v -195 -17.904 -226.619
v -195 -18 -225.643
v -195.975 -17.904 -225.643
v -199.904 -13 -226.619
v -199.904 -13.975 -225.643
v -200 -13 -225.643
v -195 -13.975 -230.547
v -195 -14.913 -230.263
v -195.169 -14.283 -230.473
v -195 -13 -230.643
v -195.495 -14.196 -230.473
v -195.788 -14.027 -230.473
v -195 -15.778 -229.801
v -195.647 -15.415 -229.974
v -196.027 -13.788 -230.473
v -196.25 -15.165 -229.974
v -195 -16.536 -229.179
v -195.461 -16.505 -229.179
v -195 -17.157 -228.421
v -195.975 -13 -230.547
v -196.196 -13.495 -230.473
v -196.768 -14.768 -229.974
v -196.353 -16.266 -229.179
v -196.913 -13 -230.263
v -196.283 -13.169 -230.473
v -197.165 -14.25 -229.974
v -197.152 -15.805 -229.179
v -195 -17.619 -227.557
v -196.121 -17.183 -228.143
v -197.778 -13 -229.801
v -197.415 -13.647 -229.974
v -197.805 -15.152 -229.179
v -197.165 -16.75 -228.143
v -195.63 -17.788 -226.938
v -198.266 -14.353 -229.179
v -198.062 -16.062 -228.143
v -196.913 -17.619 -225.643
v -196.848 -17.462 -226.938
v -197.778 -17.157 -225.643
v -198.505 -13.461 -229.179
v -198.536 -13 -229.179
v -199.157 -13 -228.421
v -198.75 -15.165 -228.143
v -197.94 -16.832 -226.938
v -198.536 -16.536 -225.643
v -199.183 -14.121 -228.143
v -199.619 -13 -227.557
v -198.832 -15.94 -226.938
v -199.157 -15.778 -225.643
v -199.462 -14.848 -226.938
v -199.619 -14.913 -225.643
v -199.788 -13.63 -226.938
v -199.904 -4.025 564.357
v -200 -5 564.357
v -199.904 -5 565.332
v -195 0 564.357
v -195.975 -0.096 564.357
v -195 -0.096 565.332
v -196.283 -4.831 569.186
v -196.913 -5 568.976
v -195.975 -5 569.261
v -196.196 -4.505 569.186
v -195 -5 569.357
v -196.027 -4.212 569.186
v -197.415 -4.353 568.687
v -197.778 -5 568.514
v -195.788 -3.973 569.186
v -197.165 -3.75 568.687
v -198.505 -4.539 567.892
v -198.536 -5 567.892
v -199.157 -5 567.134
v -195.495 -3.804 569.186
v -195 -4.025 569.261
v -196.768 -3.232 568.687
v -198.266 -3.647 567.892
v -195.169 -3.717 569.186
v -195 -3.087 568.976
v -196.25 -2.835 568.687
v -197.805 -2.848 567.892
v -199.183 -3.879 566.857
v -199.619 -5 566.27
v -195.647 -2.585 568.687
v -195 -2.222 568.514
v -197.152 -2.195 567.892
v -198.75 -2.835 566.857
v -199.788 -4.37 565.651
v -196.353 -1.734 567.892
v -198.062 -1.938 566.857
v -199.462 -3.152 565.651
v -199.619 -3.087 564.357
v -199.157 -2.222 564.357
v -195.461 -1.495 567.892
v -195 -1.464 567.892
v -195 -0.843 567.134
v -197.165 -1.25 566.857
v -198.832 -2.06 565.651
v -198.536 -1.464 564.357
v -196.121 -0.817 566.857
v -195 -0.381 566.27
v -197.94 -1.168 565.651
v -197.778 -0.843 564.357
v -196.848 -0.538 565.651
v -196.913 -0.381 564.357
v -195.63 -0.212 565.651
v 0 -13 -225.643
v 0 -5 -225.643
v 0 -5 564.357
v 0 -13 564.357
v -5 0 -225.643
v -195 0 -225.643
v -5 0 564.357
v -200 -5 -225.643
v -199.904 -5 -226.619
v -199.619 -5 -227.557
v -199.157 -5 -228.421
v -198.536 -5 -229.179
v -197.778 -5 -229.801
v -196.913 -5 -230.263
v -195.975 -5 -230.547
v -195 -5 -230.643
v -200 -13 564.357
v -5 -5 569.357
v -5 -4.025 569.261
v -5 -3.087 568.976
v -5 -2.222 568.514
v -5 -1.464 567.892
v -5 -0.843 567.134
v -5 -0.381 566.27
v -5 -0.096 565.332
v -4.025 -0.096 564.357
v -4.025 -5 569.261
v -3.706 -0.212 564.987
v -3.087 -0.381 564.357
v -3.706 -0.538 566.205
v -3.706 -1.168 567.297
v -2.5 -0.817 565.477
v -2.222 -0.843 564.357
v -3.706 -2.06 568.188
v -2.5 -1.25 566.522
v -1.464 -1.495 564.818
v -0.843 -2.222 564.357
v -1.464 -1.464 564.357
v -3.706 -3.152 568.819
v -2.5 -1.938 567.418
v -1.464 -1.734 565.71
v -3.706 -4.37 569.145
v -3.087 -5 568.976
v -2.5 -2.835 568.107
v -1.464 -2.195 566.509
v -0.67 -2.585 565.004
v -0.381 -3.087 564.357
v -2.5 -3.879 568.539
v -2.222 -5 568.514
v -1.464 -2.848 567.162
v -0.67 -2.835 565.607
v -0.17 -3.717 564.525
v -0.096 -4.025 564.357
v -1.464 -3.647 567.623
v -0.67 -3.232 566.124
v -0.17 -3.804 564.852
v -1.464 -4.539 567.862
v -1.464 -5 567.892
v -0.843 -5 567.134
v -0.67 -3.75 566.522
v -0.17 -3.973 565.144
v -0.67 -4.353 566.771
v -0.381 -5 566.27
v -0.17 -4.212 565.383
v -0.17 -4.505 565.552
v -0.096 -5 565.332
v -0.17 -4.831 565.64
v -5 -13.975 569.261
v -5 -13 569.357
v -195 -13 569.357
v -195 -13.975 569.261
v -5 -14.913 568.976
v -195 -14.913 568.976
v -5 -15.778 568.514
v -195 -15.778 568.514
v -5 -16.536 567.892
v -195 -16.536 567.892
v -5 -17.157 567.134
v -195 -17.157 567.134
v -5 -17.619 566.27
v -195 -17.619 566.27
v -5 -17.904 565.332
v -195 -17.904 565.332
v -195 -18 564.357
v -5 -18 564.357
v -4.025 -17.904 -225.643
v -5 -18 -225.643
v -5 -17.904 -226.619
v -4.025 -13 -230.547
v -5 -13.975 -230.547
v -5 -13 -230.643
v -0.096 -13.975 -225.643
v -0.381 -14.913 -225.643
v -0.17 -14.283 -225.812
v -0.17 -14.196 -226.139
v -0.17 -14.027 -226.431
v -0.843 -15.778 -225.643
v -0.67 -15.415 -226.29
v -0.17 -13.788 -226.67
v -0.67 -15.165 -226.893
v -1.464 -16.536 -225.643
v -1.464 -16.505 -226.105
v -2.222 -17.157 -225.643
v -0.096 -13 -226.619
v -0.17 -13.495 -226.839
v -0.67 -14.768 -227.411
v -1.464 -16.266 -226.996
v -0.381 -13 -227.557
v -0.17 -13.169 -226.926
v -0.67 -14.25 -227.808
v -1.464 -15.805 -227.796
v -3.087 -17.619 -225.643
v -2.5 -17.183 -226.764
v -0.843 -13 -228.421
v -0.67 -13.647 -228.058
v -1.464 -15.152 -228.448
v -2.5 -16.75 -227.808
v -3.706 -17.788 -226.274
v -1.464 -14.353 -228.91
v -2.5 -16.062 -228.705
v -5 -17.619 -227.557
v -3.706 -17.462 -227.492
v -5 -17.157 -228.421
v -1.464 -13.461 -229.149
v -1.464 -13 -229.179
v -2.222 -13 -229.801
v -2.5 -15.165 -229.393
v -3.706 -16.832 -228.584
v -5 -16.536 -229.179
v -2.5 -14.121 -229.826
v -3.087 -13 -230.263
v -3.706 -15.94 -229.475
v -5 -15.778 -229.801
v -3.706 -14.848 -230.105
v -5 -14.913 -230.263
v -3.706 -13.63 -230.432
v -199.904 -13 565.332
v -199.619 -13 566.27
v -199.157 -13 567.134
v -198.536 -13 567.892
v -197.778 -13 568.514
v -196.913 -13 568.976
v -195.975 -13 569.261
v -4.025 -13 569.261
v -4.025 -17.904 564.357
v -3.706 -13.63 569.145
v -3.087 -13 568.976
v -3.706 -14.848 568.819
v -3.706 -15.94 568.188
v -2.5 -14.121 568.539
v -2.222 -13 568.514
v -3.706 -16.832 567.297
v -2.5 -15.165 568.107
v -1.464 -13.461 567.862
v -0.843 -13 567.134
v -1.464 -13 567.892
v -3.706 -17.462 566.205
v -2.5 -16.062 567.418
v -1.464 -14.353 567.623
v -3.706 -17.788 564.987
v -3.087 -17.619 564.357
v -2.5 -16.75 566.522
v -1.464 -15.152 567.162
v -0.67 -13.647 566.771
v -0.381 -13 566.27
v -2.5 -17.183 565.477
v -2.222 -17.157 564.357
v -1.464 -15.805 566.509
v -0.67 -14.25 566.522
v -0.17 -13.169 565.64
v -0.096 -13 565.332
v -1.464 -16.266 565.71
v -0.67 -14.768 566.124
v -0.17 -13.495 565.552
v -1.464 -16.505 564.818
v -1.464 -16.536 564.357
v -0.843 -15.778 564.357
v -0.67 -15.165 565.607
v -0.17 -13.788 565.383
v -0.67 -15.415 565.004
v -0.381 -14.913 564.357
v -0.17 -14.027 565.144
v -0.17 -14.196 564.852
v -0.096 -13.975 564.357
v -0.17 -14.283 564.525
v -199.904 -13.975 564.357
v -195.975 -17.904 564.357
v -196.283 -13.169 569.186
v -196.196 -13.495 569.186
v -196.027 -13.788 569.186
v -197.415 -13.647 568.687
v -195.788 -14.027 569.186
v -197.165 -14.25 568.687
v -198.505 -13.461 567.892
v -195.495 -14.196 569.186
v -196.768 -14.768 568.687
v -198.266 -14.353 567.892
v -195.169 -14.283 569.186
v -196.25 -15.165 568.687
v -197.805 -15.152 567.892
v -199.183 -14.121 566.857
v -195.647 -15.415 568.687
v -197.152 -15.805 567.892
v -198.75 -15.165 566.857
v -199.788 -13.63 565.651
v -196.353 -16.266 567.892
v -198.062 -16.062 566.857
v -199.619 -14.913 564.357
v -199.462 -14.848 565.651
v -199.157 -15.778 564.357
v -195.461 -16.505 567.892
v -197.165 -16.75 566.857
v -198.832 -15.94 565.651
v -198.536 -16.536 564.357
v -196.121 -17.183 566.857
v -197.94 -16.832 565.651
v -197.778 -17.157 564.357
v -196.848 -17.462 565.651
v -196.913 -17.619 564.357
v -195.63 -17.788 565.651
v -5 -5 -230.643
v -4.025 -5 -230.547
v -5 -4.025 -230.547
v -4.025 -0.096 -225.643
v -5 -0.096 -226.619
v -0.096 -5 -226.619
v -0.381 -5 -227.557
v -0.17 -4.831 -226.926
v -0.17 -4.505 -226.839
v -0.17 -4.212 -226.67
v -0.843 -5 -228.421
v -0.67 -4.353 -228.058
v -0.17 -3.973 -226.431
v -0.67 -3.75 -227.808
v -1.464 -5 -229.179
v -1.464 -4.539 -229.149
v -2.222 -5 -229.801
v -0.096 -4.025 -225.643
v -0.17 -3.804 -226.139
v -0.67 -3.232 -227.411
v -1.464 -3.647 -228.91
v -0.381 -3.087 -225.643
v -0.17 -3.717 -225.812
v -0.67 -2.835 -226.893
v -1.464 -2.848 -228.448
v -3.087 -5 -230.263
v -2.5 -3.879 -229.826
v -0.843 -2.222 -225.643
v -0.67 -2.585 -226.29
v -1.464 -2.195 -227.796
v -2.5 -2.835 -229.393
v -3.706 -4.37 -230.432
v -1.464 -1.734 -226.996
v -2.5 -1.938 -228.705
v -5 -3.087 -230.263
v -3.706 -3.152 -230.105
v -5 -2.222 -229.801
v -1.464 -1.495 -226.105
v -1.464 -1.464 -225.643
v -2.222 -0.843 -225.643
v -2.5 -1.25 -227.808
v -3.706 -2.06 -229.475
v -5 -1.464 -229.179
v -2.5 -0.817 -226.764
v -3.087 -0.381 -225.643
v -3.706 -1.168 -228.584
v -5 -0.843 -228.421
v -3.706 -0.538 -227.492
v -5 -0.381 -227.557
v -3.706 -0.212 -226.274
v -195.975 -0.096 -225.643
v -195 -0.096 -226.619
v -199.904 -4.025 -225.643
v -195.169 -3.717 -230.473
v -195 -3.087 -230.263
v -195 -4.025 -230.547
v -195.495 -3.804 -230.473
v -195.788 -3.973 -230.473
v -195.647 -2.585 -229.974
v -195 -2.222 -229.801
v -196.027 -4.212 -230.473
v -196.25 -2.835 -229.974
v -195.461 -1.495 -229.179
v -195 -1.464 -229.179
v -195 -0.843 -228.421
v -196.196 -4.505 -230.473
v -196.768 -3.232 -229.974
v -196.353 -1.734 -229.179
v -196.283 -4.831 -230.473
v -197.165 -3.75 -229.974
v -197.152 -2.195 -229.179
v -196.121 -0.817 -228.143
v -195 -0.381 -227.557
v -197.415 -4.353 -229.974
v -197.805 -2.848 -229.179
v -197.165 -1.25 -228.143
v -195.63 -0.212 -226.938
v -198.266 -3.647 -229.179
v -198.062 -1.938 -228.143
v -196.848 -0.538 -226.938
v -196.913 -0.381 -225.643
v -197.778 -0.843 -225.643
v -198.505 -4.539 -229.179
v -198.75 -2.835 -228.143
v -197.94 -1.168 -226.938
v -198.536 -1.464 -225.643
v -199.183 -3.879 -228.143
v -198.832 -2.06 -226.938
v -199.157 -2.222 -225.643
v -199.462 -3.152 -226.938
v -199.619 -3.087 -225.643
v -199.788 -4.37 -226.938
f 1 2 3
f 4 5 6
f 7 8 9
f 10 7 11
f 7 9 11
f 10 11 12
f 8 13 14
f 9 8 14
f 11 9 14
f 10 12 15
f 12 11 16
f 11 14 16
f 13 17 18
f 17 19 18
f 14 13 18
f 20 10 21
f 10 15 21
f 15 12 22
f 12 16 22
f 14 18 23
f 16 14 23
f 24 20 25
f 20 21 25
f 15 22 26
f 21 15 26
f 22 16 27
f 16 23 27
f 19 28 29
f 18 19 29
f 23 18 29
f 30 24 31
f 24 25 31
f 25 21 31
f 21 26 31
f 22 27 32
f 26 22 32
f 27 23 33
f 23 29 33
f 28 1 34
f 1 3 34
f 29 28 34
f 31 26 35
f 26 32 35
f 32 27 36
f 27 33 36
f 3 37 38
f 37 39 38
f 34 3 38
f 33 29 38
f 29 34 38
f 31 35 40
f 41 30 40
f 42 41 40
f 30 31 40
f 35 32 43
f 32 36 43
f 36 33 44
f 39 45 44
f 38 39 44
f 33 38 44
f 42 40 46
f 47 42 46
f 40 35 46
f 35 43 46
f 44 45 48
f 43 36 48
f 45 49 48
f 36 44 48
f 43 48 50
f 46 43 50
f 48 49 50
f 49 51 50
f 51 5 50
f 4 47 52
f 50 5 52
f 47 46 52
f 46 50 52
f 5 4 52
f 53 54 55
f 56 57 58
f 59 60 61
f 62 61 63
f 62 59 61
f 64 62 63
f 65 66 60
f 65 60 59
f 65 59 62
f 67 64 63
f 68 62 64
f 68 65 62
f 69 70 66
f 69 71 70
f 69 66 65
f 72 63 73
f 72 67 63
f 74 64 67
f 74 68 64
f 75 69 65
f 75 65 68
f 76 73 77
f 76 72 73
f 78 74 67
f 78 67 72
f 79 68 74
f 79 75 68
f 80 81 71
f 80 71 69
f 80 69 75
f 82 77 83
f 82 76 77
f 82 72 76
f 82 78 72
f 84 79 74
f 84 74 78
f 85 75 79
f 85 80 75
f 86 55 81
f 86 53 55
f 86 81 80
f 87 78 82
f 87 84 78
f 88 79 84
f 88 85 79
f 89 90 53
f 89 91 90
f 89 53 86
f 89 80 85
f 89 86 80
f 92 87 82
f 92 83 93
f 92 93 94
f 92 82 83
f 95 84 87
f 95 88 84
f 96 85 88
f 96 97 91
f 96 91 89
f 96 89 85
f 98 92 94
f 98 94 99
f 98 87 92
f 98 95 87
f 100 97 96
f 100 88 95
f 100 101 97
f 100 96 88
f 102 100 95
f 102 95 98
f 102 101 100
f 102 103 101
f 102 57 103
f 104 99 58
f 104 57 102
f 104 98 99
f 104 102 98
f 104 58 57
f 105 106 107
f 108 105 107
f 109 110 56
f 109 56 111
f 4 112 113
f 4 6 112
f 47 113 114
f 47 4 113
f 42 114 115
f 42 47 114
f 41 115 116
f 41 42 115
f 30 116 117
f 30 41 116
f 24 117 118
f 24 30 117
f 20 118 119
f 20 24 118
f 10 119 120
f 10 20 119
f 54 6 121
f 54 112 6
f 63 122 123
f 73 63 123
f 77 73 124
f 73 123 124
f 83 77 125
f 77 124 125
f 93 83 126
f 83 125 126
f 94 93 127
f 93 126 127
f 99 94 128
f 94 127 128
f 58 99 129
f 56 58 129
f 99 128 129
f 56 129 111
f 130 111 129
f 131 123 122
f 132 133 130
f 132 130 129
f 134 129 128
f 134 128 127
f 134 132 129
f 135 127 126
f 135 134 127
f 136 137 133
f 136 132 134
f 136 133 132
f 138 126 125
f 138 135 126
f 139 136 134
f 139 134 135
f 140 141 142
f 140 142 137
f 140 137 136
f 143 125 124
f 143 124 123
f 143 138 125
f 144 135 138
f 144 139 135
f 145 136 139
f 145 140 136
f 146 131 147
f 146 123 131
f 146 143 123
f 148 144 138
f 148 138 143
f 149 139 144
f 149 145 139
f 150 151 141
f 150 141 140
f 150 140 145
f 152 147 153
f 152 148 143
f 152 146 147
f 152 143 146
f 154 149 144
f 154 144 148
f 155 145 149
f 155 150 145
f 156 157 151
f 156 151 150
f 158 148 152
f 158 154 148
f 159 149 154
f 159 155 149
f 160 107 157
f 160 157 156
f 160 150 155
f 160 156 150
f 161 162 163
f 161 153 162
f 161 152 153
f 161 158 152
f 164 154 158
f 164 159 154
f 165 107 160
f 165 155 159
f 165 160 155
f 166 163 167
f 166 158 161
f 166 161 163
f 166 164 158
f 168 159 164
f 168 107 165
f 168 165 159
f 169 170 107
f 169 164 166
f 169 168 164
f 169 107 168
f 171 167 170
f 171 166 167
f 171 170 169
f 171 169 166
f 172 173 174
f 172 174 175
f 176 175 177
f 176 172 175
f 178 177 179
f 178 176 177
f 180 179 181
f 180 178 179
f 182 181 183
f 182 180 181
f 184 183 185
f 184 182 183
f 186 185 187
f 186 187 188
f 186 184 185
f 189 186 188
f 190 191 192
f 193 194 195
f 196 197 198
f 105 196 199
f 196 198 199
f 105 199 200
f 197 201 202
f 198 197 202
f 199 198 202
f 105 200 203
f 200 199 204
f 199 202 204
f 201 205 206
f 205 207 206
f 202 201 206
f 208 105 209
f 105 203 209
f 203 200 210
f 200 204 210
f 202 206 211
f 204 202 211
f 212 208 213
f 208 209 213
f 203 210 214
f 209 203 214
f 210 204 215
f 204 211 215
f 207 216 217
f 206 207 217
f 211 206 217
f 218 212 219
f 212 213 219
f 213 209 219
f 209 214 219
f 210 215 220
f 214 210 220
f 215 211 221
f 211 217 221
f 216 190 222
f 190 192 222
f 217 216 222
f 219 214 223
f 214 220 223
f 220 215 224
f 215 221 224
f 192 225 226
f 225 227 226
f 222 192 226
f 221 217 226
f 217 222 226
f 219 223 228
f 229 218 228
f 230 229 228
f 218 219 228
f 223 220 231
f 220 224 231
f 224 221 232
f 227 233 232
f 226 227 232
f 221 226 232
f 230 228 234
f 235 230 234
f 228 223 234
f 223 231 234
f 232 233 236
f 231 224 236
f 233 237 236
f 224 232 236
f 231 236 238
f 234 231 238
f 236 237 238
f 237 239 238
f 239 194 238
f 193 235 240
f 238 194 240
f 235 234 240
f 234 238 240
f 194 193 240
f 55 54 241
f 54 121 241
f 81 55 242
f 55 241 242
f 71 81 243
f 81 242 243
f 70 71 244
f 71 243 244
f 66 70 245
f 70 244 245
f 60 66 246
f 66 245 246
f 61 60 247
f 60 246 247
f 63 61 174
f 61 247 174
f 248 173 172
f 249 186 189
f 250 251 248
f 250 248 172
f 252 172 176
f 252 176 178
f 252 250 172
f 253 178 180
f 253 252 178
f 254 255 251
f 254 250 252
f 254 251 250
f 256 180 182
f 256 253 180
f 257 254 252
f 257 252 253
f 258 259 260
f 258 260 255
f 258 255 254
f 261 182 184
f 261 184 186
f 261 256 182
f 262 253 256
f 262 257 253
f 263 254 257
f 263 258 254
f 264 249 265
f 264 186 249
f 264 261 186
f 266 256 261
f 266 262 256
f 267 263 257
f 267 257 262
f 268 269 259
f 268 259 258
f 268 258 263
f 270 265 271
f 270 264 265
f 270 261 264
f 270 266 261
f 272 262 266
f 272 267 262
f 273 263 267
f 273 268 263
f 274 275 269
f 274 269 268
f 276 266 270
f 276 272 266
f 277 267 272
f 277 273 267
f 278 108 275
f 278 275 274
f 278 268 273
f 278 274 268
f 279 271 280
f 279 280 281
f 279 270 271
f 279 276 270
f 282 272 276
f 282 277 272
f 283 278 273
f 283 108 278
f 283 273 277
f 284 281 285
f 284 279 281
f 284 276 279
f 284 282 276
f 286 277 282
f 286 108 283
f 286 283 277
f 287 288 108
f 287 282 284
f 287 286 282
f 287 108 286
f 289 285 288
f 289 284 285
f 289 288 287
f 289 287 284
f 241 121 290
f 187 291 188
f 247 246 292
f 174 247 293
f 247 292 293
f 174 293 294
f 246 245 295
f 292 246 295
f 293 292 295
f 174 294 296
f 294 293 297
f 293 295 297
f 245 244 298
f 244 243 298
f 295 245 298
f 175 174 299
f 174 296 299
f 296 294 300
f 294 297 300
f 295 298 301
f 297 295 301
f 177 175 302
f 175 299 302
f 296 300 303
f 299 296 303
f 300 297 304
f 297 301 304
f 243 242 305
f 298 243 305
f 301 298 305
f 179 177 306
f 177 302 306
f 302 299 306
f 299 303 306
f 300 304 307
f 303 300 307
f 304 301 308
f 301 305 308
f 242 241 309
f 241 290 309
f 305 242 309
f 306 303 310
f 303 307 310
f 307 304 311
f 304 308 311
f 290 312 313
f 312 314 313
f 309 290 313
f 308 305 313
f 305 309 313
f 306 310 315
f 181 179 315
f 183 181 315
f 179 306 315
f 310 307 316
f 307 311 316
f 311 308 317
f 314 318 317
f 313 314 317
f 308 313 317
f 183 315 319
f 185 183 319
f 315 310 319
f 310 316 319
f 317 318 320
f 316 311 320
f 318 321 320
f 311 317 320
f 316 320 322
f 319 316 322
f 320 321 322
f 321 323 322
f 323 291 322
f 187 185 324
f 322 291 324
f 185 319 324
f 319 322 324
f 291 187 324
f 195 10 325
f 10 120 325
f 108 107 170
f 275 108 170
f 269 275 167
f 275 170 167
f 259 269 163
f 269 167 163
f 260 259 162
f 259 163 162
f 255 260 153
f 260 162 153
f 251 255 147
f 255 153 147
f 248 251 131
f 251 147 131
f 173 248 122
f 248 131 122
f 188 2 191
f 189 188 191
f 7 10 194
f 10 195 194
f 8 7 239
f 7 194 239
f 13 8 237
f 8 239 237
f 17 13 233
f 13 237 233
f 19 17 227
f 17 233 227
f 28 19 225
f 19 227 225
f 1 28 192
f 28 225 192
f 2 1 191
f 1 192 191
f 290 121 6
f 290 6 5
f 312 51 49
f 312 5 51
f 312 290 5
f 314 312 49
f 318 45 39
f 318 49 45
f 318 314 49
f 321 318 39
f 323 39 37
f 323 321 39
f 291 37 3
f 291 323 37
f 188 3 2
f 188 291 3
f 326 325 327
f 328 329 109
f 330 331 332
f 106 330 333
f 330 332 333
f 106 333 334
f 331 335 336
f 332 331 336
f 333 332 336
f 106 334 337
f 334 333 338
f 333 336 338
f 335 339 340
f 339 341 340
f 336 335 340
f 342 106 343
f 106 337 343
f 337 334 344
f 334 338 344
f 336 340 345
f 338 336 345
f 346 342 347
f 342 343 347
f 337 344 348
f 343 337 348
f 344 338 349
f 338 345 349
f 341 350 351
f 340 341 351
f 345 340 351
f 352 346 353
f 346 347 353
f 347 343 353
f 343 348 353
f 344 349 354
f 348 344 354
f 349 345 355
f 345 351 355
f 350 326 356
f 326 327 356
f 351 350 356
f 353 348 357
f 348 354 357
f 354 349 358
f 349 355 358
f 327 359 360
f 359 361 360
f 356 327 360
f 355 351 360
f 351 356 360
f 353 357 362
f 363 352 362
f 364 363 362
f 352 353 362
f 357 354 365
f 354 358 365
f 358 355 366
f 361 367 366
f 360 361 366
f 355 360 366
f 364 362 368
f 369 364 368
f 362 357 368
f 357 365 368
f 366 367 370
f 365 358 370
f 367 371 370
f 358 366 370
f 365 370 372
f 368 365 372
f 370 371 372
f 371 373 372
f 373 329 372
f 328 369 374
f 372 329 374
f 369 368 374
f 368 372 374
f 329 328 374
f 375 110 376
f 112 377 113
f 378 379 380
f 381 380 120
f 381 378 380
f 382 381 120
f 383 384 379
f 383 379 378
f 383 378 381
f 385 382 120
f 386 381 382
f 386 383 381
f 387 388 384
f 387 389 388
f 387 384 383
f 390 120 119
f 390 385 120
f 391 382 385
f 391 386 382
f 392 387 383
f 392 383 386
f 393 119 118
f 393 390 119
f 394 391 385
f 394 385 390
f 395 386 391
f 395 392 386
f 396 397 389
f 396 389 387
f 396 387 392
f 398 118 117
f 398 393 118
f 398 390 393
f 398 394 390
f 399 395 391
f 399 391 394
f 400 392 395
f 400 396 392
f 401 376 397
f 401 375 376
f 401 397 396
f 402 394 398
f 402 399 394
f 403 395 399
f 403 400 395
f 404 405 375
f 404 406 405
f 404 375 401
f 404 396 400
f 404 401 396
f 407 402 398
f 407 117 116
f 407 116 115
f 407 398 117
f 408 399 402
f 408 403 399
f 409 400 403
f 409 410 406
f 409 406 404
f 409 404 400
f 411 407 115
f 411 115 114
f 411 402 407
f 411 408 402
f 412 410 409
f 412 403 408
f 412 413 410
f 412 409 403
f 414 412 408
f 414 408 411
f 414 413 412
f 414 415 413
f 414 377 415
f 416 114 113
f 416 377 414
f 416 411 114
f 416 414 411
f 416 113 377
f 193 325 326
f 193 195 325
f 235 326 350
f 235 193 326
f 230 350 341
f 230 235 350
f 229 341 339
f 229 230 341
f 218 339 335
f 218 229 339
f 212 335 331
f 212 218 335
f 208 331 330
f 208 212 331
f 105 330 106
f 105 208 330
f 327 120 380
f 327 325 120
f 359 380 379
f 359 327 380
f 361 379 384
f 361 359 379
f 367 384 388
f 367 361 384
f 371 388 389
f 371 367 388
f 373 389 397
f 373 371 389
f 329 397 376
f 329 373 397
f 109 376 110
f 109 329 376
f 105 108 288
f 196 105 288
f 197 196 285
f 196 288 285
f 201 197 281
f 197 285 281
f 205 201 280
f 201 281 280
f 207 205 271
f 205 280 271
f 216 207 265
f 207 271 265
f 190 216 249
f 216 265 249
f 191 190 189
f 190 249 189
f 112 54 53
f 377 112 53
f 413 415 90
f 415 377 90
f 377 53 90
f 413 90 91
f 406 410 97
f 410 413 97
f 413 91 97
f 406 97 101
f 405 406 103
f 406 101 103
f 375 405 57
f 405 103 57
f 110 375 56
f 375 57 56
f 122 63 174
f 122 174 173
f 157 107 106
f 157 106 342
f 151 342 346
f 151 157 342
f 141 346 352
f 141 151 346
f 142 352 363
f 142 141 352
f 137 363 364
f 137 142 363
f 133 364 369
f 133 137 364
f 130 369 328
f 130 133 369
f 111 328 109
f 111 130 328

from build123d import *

# Parameters (mm, degrees)
F0_W         = 200
F0_H         = 800
F1_DEPTH     = 18
F2_R         = 5
F3_T1_DEPTH  = 8
F3_S5_W      = 5
F3_S5_H      = 5
F3_T6_DEPTH  = 5
F3_S11_W     = 5
F3_S11_H     = 5
F3_T12_DEPTH = 5


# Not quite as in the source:
# - a fillet or chamfer that OpenCascade refuses, or shapes differently, is made with other operations: its cross-section is extruded or revolved along the edge and cut away or added


with BuildPart() as f1:
    # F0 (on Front) → F1 (new body)
    with BuildSketch(Plane.XZ):
        with Locations((-100, 169.3565798058)):
            Rectangle(F0_W, F0_H)
    extrude(amount=F1_DEPTH)

    # F2
    f2_edges = [f1.edges().sort_by_distance(p)[0] for p in [
        (-200, -18, 169.35658),
        (-200, 0, 169.35658),
        (-100, -18, -230.64342),
        (-100, 0, -230.64342),
        (0, -18, 169.35658),
        (-200, -9, -230.64342),
        (0, -9, -230.64342),
        (-200, -9, 569.35658),
        (-100, -18, 569.35658),
        (-100, 0, 569.35658),
        (0, 0, 169.35658),
    ]]
    fillet(f2_edges, radius=F2_R)

    # F3: fillet of radius 5 on 1 edges, made by hand

    # F3_s2 → F3_t1 (cut)
    with BuildSketch(Plane.XZ.offset(5)):
        with BuildLine():
            ThreePointArc((0, 564.3565798058), (-1.4644660941, 567.8921137117), (-5, 569.3565798058))
            Line((-5, 569.3565798058), (0, 569.3565798058))
            Line((0, 569.3565798058), (0, 564.3565798058))
        make_face()
    extrude(amount=F3_T1_DEPTH, mode=Mode.SUBTRACT)


with BuildPart() as f3_tool4:
    # F3_s5 → F3_t6 (new body)
    with BuildSketch(Plane.YZ.offset(-5)):
        with Locations((-2.5, 566.8565798058)):
            Rectangle(F3_S5_W, F3_S5_H)
    extrude(amount=F3_T6_DEPTH)

    # F3_s7 → F3_t8 (revolve, cut)
    with BuildSketch(Plane(origin=(-5, -5, 564.3565798058), x_dir=(0, -0.7071067812, -0.7071067812), z_dir=(0, -0.7071067812, 0.7071067812))):
        with BuildLine():
            ThreePointArc((0, -5), (5, 0), (0, 5))
            Line((0, 5), (0, -5))
        make_face()
    revolve(axis=Axis((-5, -5, 564.3565798058), (1, 0, 0)), mode=Mode.SUBTRACT)


with BuildPart() as f1_1:
    add(f1.part)

    # F3_t3: cut F3_tool4
    add(f3_tool4.part, mode=Mode.SUBTRACT)


with BuildPart() as f3_tool10:
    # F3_s11 → F3_t12 (new body)
    with BuildSketch(Plane.YZ.offset(-5)):
        with Locations((-15.5, 566.8565798058)):
            Rectangle(F3_S11_W, F3_S11_H)
    extrude(amount=F3_T12_DEPTH)

    # F3_s13 → F3_t14 (revolve, cut)
    with BuildSketch(Plane(origin=(-5, -13, 564.3565798058), x_dir=(0, 0.7071067812, -0.7071067812), z_dir=(0, -0.7071067812, -0.7071067812))):
        with BuildLine():
            ThreePointArc((0, -5), (5, 0), (0, 5))
            Line((0, 5), (0, -5))
        make_face()
    revolve(axis=Axis((-5, -13, 564.3565798058), (1, 0, 0)), mode=Mode.SUBTRACT)


with BuildPart() as f1_2:
    add(f1_1.part)

    # F3_t9: cut F3_tool10
    add(f3_tool10.part, mode=Mode.SUBTRACT)


solid = f1_2.part
